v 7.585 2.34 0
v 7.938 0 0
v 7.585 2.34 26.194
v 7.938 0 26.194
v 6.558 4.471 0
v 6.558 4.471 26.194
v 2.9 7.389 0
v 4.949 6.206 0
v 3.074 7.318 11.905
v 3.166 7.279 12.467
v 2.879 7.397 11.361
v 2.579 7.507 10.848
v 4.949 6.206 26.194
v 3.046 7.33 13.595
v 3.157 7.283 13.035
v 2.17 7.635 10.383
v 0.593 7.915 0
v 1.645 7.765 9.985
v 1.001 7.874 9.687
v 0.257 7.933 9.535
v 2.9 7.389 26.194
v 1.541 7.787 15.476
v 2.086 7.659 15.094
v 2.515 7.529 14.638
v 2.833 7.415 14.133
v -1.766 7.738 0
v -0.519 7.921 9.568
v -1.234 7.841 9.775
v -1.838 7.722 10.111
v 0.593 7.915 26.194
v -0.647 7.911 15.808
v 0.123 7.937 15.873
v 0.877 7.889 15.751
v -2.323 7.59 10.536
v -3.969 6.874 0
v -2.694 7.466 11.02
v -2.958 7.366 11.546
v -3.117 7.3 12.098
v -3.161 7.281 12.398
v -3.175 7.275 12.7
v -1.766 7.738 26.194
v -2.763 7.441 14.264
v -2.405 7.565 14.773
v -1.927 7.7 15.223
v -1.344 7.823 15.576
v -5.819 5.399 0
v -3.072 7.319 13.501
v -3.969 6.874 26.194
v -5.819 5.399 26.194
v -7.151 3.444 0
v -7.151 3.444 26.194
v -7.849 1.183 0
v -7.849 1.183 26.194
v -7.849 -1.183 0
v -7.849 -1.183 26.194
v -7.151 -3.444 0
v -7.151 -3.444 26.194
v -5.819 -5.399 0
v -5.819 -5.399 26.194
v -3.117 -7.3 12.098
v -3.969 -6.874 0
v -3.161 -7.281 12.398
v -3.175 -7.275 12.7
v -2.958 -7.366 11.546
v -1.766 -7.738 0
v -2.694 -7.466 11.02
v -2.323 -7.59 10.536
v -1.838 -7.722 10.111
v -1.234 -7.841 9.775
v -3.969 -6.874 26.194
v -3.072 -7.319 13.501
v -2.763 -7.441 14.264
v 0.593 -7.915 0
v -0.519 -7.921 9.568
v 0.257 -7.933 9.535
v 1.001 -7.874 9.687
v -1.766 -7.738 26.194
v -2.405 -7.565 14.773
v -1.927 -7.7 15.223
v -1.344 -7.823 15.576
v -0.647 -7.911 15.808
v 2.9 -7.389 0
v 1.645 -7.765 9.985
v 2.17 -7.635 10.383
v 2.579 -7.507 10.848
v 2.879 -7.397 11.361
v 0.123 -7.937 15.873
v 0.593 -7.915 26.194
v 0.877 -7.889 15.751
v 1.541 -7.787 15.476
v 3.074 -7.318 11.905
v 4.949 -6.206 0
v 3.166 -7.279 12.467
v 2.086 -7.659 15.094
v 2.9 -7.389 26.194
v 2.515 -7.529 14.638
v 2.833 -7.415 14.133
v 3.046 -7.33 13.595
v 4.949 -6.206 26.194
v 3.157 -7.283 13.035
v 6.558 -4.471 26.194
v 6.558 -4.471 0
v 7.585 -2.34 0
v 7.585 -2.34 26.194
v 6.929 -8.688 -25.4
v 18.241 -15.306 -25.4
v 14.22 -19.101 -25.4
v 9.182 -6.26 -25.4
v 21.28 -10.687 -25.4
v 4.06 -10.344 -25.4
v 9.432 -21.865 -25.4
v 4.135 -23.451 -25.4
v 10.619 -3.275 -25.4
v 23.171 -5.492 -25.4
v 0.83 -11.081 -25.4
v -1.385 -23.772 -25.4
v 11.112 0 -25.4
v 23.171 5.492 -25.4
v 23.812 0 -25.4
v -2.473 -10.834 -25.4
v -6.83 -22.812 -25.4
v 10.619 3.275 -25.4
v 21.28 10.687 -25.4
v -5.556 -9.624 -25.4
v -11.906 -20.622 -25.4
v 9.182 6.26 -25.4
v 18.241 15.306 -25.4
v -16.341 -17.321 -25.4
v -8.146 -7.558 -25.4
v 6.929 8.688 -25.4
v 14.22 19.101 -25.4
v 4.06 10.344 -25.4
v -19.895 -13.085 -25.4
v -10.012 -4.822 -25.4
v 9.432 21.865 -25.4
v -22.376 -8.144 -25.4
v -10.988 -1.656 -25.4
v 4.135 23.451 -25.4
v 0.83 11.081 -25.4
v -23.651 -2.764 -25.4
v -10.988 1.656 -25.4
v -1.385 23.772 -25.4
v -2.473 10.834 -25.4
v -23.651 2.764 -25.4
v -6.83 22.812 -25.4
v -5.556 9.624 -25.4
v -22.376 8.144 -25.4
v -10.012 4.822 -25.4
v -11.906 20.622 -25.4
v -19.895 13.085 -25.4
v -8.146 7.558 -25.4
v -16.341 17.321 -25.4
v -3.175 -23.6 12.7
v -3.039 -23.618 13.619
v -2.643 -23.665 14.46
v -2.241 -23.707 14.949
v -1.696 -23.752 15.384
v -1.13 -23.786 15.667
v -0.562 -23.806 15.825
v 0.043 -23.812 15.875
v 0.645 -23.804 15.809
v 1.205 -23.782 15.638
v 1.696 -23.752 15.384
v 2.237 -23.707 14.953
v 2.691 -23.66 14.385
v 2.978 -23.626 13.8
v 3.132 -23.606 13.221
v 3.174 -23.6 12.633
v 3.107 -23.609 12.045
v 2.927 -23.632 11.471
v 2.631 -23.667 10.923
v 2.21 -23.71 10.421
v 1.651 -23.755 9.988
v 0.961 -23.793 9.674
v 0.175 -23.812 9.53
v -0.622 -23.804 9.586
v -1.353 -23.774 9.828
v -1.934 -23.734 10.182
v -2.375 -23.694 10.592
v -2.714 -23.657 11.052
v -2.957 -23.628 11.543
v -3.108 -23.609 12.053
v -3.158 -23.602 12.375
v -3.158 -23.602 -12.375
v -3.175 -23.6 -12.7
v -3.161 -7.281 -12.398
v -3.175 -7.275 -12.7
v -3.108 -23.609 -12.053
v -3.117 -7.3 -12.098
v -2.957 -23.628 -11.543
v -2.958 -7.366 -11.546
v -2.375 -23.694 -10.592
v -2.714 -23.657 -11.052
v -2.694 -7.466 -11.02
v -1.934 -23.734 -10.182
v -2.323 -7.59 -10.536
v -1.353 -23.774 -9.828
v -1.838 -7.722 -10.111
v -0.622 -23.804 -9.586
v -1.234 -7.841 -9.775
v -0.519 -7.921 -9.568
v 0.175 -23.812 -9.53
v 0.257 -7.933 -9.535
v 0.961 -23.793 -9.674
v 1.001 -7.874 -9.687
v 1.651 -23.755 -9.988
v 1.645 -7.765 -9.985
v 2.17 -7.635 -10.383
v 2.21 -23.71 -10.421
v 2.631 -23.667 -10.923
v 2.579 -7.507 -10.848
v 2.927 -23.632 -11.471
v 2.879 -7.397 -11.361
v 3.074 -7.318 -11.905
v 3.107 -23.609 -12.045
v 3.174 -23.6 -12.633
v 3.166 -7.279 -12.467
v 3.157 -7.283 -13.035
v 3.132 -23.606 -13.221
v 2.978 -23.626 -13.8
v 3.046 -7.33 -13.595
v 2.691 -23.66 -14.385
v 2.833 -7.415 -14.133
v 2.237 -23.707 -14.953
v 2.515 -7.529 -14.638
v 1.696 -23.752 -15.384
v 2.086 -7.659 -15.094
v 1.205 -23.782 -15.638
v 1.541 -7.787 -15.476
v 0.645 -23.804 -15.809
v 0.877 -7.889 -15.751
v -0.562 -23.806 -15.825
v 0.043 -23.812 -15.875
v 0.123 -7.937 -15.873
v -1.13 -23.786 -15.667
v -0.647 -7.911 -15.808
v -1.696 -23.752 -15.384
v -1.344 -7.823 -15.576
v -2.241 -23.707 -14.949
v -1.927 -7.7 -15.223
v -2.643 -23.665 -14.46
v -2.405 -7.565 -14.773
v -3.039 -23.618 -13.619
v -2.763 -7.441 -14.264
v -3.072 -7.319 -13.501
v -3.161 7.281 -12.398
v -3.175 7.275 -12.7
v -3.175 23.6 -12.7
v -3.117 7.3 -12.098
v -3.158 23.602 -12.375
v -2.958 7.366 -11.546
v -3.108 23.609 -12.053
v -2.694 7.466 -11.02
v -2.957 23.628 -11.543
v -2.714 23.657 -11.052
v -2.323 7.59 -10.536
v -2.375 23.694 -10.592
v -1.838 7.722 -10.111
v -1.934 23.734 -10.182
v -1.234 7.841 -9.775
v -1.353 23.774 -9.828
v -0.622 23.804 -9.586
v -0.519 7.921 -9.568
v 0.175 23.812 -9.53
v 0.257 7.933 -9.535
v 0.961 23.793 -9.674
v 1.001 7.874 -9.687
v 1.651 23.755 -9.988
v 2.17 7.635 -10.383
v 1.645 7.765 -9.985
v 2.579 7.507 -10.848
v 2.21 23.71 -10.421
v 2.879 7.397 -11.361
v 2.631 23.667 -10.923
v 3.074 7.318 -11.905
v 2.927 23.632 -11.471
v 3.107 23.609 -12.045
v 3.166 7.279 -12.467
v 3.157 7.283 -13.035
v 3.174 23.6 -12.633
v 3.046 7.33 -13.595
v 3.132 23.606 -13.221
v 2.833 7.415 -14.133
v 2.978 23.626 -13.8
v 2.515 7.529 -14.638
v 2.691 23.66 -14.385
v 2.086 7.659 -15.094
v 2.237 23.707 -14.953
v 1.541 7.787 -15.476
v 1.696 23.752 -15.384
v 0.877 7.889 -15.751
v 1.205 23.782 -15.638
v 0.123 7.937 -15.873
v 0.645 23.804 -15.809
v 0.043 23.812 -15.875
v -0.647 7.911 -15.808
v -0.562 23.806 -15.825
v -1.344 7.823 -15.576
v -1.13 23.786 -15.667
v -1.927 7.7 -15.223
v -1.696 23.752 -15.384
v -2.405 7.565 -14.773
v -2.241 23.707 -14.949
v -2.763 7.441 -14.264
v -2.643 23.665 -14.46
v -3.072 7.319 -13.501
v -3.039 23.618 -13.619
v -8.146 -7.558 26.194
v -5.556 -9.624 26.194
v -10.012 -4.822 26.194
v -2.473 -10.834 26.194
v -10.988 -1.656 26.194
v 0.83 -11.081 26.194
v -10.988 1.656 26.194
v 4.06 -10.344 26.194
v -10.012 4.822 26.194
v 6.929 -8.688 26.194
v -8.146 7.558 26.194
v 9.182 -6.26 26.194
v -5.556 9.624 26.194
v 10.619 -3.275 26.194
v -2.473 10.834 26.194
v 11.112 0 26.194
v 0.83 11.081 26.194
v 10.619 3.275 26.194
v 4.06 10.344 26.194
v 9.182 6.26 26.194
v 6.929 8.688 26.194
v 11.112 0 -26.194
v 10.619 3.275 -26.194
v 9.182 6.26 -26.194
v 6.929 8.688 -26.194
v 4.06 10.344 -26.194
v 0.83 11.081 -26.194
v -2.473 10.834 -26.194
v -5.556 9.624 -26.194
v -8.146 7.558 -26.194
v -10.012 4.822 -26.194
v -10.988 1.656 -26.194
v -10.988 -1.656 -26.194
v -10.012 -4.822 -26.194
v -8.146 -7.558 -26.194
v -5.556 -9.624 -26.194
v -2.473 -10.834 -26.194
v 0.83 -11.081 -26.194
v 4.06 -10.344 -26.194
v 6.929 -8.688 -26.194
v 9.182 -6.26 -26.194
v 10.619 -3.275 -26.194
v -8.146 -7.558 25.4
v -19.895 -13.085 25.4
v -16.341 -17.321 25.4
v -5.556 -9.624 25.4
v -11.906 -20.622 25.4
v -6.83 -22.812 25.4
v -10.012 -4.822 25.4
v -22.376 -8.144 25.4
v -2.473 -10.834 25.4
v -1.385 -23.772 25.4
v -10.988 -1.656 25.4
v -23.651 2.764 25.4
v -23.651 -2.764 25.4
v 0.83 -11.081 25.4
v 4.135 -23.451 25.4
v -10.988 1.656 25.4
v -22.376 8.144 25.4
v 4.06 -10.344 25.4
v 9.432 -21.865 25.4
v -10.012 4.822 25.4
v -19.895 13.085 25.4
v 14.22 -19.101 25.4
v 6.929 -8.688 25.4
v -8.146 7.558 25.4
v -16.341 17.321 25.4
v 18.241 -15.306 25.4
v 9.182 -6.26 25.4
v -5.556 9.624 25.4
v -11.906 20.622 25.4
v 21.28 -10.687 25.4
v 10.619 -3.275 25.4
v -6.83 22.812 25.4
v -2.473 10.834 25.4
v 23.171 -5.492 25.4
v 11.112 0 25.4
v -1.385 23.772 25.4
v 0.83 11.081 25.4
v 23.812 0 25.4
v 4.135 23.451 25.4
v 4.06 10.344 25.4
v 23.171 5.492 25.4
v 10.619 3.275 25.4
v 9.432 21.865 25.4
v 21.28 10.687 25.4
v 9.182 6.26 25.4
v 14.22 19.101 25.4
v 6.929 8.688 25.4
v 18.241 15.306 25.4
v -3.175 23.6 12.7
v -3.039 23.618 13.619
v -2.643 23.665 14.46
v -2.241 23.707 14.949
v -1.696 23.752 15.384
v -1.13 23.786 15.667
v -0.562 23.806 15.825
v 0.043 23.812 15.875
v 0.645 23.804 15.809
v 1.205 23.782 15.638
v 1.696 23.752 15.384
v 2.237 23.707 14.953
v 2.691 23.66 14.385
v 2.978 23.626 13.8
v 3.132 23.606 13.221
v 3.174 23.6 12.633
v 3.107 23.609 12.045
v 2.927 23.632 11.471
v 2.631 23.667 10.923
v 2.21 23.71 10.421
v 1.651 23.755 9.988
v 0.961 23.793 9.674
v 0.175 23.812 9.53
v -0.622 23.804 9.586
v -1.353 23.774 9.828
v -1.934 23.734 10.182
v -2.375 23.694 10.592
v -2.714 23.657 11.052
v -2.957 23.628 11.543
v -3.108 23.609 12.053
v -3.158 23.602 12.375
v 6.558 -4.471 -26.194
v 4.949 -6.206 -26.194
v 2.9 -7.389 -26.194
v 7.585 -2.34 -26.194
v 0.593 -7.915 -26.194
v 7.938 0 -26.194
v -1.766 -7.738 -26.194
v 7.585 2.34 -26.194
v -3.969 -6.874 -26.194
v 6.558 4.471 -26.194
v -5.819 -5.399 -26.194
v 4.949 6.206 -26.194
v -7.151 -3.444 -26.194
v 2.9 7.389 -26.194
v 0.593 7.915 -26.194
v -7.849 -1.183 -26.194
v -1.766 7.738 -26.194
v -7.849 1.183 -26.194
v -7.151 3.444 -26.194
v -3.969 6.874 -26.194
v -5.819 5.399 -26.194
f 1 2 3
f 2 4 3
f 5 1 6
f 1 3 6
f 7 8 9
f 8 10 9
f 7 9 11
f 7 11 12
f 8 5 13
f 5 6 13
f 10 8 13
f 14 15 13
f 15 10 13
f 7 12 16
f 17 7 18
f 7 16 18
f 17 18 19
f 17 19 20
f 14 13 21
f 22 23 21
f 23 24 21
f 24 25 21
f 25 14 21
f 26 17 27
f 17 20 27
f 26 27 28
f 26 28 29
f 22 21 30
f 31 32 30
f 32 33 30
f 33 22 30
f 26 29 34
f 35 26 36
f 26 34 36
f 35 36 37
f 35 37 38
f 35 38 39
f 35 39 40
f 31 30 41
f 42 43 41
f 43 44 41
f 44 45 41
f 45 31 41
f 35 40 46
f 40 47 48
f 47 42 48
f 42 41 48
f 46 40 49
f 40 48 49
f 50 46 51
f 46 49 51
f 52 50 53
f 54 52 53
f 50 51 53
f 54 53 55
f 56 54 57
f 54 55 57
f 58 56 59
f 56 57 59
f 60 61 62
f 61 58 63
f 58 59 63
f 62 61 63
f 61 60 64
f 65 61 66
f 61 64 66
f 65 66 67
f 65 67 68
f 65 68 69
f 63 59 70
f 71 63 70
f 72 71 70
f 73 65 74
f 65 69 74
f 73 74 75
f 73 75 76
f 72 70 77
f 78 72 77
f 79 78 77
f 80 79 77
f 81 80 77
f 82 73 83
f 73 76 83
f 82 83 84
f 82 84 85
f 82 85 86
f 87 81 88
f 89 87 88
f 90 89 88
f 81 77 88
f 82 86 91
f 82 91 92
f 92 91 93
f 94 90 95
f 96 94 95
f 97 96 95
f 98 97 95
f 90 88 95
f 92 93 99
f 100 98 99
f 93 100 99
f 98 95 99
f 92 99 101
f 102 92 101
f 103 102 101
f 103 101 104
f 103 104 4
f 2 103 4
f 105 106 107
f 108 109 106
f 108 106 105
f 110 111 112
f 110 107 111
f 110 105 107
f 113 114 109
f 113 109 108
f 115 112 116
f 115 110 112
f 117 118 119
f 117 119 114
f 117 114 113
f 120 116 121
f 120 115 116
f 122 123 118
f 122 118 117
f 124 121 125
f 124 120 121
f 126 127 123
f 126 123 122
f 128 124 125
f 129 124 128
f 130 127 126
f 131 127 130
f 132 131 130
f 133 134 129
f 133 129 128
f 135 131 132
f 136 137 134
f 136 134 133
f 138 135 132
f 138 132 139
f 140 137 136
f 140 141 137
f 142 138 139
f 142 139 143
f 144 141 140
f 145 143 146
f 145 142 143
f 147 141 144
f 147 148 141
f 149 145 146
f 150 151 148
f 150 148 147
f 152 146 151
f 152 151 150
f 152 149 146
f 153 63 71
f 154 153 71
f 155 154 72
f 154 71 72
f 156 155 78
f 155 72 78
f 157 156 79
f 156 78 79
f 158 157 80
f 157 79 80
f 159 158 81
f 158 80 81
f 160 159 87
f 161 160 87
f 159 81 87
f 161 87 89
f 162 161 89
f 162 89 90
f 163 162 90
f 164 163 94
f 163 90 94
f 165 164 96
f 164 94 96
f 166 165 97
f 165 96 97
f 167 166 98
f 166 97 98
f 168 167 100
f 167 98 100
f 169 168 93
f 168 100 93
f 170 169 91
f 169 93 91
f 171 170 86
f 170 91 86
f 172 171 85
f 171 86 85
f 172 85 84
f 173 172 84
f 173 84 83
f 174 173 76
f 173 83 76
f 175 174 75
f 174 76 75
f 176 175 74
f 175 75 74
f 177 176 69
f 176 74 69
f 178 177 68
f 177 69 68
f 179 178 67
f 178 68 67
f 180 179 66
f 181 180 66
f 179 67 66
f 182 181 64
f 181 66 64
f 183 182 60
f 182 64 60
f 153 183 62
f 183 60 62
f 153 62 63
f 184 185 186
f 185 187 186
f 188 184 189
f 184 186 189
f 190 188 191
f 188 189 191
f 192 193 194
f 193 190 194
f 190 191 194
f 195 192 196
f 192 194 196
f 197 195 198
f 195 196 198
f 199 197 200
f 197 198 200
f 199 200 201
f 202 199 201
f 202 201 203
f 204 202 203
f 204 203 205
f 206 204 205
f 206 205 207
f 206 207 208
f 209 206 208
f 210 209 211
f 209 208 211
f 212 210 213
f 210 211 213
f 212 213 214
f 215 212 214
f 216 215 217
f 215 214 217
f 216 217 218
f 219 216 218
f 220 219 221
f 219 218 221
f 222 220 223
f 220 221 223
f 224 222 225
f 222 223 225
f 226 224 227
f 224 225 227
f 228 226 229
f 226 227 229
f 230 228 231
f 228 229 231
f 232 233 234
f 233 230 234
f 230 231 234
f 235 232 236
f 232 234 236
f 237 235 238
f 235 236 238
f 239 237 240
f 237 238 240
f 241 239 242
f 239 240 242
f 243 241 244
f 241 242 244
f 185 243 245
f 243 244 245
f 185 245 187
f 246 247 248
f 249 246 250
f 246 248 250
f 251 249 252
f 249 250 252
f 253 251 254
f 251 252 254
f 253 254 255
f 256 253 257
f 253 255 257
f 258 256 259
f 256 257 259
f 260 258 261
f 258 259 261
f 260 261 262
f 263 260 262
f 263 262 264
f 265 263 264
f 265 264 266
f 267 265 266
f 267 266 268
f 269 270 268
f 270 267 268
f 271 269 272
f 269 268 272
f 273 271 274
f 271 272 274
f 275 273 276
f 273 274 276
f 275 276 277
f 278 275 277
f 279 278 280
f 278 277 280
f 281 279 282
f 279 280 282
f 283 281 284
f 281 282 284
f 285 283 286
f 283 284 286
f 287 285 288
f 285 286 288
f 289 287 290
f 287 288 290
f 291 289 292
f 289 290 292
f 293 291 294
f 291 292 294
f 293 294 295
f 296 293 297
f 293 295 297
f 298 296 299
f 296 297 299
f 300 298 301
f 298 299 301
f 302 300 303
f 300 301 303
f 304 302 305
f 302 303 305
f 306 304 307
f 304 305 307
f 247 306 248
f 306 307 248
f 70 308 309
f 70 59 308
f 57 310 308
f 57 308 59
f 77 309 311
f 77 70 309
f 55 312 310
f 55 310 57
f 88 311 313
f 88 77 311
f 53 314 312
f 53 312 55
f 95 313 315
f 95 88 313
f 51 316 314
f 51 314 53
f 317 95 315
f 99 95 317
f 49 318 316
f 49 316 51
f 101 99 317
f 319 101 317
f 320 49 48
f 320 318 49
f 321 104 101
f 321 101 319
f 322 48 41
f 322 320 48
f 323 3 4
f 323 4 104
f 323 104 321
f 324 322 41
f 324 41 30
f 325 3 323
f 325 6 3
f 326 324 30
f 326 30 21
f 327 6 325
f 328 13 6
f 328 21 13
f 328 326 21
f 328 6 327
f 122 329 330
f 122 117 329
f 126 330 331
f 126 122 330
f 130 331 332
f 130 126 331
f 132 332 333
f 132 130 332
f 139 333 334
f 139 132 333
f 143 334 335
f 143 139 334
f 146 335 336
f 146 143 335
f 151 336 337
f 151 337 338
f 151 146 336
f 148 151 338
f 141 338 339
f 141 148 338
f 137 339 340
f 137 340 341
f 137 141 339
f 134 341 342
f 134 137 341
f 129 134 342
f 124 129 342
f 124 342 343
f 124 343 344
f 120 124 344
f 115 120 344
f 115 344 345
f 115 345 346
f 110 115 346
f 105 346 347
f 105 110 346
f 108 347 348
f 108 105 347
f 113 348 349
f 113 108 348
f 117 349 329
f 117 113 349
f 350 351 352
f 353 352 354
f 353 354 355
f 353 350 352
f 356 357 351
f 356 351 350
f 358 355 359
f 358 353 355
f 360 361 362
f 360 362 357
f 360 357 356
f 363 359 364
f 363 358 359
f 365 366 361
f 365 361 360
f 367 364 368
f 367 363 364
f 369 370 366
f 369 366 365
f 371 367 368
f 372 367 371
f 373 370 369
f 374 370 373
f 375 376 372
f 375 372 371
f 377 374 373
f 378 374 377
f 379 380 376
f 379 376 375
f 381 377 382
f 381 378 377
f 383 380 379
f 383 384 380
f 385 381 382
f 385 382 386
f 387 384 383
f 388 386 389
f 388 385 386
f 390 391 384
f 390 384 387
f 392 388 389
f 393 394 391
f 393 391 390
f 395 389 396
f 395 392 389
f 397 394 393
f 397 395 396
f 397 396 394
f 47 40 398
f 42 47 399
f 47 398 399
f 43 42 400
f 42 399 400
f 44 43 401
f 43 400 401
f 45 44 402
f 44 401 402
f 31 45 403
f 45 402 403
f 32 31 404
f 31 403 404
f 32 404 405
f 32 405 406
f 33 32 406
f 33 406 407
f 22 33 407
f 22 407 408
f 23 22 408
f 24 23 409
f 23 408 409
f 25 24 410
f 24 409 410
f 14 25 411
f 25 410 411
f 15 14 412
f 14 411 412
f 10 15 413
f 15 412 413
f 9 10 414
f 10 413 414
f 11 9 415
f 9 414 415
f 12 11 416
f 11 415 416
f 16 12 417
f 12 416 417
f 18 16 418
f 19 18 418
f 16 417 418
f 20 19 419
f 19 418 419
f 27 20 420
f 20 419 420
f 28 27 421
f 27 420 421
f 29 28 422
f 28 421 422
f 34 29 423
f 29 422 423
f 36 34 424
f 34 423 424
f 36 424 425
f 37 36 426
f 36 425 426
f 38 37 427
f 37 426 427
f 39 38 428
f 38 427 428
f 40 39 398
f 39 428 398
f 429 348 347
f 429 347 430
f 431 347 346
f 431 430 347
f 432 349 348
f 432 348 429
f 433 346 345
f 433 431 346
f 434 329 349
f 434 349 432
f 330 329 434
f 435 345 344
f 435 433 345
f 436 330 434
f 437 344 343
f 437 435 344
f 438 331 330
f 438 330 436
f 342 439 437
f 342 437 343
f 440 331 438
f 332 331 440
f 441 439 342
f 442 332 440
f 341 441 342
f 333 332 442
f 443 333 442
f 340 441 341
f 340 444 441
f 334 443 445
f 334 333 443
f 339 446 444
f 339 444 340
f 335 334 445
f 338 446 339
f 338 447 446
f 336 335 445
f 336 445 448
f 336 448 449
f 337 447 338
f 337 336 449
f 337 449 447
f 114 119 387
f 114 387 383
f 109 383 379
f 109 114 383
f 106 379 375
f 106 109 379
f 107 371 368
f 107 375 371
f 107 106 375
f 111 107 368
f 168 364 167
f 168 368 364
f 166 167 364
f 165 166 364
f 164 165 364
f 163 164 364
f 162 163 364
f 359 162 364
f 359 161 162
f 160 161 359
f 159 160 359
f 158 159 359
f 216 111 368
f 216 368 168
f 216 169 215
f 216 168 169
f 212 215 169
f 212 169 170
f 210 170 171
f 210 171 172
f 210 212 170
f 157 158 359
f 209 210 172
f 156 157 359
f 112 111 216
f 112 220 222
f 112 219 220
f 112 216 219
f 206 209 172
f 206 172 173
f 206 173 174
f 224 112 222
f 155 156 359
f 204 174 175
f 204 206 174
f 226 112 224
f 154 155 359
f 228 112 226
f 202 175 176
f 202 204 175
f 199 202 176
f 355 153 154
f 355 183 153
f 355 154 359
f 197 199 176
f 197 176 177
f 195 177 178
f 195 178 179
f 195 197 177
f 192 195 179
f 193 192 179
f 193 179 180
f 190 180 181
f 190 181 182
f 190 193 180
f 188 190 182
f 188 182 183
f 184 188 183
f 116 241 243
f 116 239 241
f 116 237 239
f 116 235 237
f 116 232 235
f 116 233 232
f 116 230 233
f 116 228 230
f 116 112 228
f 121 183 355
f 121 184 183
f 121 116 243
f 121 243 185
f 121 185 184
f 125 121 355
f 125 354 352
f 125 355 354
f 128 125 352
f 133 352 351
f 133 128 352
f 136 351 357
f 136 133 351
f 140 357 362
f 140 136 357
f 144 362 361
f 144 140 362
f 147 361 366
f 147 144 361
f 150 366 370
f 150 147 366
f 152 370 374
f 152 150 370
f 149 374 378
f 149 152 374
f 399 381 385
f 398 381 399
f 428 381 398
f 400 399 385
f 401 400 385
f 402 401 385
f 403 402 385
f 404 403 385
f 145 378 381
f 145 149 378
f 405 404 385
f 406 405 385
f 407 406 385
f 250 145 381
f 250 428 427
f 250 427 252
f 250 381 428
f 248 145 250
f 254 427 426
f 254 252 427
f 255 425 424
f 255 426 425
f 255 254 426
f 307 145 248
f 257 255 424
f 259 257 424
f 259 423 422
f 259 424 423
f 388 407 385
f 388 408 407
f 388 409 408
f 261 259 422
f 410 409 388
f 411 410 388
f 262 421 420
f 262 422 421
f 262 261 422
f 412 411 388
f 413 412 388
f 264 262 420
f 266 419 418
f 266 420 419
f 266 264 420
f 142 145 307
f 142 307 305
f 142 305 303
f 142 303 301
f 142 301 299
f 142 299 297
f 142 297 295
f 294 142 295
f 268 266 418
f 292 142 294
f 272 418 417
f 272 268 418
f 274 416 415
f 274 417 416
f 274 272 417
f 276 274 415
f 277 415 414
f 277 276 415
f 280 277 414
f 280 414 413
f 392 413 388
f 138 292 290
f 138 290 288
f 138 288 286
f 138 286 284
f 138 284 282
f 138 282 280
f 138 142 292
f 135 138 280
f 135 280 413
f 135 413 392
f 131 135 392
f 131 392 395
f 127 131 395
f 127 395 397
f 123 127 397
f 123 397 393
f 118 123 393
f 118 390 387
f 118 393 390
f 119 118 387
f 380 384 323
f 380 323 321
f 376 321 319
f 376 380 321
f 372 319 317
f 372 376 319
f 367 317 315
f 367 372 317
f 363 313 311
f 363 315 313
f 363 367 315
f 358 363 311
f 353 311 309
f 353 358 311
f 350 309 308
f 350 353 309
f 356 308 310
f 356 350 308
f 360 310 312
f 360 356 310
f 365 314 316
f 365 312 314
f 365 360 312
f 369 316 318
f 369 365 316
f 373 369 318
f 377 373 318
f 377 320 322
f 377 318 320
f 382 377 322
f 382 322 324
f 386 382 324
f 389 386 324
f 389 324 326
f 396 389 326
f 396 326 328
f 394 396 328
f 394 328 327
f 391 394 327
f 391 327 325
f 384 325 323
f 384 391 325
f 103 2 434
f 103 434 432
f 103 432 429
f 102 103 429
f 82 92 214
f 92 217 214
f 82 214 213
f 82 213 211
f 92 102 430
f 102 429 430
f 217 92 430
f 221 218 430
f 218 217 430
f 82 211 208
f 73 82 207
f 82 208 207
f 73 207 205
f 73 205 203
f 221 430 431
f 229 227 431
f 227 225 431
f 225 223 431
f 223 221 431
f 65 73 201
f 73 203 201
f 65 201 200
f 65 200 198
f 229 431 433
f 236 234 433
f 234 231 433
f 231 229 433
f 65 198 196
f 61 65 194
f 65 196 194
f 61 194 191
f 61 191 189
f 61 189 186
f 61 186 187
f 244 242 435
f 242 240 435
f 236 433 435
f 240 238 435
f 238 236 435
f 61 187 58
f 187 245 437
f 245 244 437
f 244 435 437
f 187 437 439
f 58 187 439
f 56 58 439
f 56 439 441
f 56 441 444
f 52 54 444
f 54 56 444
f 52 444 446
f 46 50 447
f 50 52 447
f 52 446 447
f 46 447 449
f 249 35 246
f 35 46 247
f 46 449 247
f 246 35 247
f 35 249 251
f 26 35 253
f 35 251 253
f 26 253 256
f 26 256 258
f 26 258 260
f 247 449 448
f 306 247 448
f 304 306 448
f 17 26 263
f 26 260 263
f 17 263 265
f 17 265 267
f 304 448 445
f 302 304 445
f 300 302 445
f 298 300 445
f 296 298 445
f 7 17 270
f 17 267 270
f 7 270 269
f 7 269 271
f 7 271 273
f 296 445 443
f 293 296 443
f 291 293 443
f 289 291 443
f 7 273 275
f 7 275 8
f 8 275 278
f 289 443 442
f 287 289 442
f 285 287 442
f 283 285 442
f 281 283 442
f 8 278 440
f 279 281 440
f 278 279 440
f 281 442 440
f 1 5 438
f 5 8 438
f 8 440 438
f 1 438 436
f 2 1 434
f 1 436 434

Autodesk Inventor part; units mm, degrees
ref_plane "YZ Plane" through (0, 0, 0) normal (1, 0, 0) x (0, 1, 0)
ref_plane "XZ Plane" through (0, 0, 0) normal (0, 1, 0) x (-1, 0, 0)
ref_plane "XY Plane" through (0, 0, 0) normal (0, 0, 1) x (1, 0, 0)
sketch "Sketch1" plane through (0, 0, 0) normal (0, 0, 1) x (1, 0, 0)
  circle A0 centre (0, 0) radius 23.8125
  dimension "d0" = 47.625
extrude "Extrusion1" add sketch "Sketch1" along normal blind 25.4
sketch "Sketch2" plane through (0, 0, 25.4) normal (0, 0, 1) x (1, 0, 0)
  circle A0 centre (0, 0) radius 23.8125 projected
  circle A1 centre (0, 0) radius 11.1125
  dimension "d3" = 22.225
extrude "Extrusion2" add sketch "Sketch2" along normal blind 0.7937 contours A1
sketch "Sketch3" plane through (0, 0, 26.1938) normal (0, 0, 1) x (1, 0, 0)
  circle A0 centre (0, 0) radius 11.1125 projected
  circle A1 centre (0, 0) radius 7.9375
  dimension "d6" = 15.875
extrude "Extrusion3" cut sketch "Sketch3" against normal through all contours A1
sketch "Sketch4" plane through (0, 0, 0) normal (0, 1, 0) x (-1, 0, 0)
  line L0 (7.9375, 0) -> (-7.9375, 0) projected
  line L1 (-7.9375, 26.1938) -> (7.9375, 26.1938) projected
  circle A0 centre (0, 12.7) radius 3.175
  line L2 (0, 0) -> (0, 26.1938)
  line L3 (23.8125, 25.4) -> (-23.8125, 25.4) projected
  dimension "d9" = 6.35
  dimension "d10" = 12.7
extrude "Extrusion4" cut sketch "Sketch4" along normal through all both and the other way through all
mirror "Mirror1" about plane through (0, 0, 0) normal (0, 0, -1)
properties part number "Winch Body"
